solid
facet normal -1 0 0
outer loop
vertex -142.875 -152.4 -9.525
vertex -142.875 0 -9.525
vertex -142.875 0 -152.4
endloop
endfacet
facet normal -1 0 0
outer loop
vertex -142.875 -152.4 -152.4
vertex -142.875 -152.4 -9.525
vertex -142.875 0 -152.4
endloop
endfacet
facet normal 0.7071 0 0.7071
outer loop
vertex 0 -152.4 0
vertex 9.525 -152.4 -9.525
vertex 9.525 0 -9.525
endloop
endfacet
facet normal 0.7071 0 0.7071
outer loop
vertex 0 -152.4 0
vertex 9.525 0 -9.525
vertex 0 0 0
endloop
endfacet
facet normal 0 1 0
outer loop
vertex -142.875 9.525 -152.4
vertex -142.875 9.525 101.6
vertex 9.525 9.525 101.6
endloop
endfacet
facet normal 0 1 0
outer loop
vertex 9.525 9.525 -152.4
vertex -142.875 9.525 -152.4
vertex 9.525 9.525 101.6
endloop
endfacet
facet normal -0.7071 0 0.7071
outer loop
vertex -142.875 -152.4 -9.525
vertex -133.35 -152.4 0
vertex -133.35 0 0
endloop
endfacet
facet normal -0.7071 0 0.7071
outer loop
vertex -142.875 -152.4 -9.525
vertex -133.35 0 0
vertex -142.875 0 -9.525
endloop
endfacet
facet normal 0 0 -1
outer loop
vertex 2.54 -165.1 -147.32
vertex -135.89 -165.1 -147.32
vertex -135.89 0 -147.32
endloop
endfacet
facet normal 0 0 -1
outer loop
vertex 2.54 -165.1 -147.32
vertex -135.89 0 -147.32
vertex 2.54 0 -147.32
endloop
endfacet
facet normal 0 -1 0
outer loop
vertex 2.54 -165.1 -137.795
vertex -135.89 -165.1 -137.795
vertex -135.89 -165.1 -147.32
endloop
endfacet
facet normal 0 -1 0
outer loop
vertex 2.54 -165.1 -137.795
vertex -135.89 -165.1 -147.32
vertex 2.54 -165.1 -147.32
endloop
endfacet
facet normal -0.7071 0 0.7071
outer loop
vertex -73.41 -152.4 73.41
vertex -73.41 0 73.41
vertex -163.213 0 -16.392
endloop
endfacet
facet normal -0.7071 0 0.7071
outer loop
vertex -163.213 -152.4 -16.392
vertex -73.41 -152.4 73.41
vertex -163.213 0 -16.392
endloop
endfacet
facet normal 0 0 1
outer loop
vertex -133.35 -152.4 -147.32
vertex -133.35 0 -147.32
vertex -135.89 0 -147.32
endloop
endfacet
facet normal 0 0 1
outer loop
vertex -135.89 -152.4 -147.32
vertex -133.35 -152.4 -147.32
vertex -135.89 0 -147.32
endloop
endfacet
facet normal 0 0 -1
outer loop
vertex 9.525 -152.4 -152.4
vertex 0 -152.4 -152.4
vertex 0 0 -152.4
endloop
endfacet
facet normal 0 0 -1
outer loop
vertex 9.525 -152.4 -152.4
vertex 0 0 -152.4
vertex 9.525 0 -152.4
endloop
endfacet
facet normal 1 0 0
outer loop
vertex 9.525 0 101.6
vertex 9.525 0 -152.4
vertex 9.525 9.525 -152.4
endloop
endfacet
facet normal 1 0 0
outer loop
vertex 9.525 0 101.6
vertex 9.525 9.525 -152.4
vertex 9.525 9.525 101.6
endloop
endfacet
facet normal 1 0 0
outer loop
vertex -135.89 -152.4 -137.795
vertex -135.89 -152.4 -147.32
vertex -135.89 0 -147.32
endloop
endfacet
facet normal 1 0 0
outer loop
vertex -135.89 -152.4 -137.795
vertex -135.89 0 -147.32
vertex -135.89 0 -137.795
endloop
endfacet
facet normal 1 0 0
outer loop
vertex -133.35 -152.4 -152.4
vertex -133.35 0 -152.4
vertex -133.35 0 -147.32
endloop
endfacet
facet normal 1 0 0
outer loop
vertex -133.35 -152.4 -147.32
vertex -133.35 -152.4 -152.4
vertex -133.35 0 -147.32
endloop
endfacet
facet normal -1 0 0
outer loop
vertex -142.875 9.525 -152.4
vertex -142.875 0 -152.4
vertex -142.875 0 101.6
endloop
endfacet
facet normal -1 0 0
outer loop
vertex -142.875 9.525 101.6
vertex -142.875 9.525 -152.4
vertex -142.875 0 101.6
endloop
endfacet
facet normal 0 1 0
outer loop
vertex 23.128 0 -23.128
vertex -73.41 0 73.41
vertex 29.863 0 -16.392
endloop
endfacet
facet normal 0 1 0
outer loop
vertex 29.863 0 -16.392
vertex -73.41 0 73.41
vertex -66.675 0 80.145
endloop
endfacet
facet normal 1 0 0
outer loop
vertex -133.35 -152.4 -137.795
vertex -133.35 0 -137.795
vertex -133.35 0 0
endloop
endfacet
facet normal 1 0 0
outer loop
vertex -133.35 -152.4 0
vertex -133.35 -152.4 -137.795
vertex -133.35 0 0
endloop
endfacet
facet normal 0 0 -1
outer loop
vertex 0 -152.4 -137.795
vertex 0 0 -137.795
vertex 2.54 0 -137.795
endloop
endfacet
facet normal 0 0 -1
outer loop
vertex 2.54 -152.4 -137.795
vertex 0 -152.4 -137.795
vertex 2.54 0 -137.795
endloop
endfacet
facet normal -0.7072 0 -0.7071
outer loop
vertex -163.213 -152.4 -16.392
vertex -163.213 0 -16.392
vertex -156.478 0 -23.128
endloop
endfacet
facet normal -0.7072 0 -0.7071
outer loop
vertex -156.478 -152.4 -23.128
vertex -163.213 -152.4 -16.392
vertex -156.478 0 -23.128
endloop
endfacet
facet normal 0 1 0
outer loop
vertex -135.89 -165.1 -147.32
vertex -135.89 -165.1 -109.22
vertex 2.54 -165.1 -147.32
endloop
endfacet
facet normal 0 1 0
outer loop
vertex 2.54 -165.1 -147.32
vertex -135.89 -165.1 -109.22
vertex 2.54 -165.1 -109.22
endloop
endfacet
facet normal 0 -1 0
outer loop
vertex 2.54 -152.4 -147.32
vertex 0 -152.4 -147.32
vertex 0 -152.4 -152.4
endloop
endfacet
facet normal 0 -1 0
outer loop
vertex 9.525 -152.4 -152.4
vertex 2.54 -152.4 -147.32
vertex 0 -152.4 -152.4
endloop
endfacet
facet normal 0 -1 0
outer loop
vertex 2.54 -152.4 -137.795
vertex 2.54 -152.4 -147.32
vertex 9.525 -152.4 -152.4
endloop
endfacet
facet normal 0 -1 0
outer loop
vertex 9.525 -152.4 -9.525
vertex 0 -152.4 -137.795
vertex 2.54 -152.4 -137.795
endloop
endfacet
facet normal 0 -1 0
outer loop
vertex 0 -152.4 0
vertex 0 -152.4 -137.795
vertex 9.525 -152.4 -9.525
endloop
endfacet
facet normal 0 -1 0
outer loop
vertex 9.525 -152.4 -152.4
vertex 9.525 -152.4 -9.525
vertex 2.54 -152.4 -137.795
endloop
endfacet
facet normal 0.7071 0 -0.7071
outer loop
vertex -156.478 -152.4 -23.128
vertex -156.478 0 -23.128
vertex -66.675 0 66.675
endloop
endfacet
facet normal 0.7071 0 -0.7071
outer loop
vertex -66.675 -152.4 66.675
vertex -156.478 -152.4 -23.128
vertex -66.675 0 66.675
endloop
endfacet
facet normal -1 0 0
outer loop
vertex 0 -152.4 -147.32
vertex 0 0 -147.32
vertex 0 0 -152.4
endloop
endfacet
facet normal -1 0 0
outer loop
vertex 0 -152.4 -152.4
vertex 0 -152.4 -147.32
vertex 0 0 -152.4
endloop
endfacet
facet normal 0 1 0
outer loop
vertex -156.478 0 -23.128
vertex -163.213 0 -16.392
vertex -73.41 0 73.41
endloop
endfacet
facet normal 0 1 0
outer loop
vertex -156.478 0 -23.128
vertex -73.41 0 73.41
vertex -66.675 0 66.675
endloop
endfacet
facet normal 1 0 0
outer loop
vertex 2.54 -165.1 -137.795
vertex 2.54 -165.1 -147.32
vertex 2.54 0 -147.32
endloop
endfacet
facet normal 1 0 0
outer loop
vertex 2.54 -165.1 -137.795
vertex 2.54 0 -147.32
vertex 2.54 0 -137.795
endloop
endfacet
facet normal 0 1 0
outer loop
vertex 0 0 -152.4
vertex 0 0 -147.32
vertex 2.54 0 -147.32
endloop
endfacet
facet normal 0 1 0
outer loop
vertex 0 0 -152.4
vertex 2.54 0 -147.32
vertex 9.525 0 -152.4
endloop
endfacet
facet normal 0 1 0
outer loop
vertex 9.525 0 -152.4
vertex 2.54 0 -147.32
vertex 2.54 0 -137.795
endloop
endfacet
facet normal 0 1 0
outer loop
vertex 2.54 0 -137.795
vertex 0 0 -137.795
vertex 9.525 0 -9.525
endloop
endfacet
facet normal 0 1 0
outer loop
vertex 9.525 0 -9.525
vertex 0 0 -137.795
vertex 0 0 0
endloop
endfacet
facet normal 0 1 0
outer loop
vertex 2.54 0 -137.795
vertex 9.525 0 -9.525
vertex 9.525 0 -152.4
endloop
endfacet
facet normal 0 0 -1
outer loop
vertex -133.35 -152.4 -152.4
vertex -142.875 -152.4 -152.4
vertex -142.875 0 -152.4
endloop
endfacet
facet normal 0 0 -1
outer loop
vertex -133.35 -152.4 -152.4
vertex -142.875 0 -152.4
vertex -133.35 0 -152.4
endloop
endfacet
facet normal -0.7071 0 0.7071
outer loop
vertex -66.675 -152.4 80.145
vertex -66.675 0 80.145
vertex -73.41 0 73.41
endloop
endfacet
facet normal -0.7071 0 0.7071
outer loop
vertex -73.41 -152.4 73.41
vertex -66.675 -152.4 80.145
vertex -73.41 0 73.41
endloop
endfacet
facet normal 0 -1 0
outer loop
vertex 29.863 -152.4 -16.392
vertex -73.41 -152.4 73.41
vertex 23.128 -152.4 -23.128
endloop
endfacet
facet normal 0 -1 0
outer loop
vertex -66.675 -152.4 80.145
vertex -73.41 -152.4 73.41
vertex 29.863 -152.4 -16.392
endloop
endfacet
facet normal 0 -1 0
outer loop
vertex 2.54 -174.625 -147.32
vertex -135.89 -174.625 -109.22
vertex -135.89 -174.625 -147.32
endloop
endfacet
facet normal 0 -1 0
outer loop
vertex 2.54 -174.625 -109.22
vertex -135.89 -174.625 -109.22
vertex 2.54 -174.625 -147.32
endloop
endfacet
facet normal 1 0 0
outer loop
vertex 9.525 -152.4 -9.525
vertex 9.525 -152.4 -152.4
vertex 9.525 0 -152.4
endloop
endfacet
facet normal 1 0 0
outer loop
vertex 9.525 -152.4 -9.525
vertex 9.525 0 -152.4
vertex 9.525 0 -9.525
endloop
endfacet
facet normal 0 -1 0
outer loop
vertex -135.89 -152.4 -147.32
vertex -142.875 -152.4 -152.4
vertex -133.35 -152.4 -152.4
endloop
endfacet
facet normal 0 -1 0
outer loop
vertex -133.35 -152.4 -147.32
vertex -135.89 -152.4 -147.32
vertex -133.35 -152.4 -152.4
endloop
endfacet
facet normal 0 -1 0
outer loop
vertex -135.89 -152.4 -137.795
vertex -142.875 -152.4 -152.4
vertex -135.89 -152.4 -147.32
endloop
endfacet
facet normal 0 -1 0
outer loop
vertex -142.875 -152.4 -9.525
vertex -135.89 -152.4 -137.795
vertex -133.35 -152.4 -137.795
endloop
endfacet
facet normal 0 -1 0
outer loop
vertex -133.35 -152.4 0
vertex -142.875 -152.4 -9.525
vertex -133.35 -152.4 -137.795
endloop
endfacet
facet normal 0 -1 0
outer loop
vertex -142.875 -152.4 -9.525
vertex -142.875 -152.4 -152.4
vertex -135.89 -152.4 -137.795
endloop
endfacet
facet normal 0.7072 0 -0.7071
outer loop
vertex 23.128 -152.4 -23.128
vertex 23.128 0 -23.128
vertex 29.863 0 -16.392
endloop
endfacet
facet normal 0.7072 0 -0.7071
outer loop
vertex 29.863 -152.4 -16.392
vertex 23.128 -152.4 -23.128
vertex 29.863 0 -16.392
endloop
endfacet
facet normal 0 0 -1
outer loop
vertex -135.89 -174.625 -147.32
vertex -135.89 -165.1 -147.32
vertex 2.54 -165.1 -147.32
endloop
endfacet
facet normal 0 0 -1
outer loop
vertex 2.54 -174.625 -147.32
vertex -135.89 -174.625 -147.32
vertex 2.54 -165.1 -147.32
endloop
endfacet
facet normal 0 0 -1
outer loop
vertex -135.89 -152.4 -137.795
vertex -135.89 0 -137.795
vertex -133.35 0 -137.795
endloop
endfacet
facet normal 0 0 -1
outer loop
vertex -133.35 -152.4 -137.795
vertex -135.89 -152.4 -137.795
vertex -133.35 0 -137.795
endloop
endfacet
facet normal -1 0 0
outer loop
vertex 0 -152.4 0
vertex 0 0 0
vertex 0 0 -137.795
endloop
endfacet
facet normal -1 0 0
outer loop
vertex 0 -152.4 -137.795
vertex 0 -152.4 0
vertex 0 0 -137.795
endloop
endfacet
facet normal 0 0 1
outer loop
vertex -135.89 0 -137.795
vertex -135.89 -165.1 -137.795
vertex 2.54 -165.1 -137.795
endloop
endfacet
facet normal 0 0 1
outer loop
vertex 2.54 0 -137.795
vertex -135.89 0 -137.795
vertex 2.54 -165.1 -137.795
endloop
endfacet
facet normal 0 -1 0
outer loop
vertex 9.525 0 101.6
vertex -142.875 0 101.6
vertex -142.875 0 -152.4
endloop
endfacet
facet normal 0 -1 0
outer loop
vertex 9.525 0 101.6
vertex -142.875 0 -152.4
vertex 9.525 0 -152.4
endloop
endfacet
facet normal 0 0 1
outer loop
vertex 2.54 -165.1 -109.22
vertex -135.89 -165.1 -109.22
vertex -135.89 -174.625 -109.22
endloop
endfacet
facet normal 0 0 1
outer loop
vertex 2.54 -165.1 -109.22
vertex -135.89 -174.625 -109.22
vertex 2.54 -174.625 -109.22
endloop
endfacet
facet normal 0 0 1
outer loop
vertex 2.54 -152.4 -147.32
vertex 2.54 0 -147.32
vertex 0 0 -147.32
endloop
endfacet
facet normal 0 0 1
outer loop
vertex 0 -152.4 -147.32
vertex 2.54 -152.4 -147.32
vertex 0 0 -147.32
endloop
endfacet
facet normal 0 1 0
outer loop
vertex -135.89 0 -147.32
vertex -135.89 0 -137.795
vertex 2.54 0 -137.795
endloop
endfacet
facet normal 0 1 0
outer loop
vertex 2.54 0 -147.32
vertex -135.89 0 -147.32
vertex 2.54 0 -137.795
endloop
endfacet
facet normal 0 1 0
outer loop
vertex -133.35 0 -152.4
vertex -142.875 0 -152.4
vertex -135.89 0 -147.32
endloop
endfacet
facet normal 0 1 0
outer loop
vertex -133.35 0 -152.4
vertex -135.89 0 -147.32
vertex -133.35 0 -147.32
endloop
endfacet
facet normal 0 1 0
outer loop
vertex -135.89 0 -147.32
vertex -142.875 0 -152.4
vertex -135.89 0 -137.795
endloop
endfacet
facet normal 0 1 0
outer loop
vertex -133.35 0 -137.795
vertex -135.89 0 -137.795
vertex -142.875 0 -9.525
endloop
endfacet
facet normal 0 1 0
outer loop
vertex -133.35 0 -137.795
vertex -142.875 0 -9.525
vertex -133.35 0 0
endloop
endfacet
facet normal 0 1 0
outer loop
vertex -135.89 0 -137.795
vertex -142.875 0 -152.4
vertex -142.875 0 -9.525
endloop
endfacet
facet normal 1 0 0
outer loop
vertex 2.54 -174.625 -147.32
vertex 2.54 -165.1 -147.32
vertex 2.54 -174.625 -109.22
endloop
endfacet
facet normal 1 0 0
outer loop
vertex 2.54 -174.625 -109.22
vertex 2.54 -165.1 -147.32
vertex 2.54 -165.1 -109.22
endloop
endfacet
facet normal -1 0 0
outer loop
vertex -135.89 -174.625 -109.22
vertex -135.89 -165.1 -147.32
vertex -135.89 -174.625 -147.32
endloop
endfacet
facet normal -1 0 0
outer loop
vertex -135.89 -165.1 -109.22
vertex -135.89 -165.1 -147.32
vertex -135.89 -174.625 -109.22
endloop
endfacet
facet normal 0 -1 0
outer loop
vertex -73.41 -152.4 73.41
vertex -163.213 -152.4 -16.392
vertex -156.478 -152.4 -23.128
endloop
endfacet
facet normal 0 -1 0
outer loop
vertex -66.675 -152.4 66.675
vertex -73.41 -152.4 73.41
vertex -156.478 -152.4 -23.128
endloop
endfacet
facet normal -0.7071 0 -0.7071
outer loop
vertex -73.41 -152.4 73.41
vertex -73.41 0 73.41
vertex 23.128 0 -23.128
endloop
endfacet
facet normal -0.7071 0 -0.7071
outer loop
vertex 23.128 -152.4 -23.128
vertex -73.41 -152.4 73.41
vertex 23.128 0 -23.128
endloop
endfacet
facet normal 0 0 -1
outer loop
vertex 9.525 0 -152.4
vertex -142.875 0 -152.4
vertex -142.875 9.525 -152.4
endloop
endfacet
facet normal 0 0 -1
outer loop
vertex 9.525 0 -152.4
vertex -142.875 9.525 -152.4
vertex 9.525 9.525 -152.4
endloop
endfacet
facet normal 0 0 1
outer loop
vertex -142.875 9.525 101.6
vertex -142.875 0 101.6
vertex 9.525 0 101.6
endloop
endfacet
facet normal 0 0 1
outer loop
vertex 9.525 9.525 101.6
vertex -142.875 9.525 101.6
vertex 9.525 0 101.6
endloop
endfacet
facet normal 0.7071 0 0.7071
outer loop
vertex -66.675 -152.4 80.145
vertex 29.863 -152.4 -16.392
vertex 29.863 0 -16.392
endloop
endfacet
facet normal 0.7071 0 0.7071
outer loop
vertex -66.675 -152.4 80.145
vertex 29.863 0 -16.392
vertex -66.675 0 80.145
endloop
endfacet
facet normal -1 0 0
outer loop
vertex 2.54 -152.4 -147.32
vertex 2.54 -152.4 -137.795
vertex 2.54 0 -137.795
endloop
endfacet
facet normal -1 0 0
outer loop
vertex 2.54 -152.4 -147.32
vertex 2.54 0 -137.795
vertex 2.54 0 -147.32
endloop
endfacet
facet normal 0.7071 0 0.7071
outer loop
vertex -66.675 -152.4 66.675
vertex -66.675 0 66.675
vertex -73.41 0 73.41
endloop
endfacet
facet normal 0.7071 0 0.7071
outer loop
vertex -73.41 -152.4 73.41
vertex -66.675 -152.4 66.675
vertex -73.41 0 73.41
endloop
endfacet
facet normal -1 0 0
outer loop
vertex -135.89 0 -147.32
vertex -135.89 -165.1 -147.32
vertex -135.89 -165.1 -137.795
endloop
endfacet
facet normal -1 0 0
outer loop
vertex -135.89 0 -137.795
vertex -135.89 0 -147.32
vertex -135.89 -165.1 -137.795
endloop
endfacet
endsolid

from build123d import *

# Parameters (mm, degrees)
F1_DEPTH  = 152.4
F2_W      = 138.43
F2_H      = 9.525
F3_DEPTH  = 165.1
F5_DEPTH  = 152.4
F7_DEPTH  = 152.4
F8_W      = 138.43
F8_H      = 38.1
F9_DEPTH  = 9.525
F10_W     = 152.4
F10_H     = 254
F11_DEPTH = 9.525


with BuildPart() as f1:
    # F0 (on Front) → F1 (new body)
    with BuildSketch(Plane.XZ):
        Polygon((0, -147.32), (0, -152.4), (9.525, -152.4), (9.525, -9.525), (0, 0), (0, -137.795), (2.54, -137.795), (2.54, -147.32), align=None)
        Polygon((-133.35, -152.4), (-133.35, -147.32), (-135.89, -147.32), (-135.89, -137.795), (-133.35, -137.795), (-133.35, 0), (-142.875, -9.525), (-142.875, -152.4), align=None)
    extrude(amount=F1_DEPTH)


with BuildPart() as f3:
    # F2 (on Front) → F3 (new body)
    with BuildSketch(Plane.XZ):
        with Locations((-66.675, -142.5575)):
            Rectangle(F2_W, F2_H)
    extrude(amount=F3_DEPTH)


with BuildPart() as f5:
    # F4 (on Front) → F5 (new body)
    with BuildSketch(Plane.XZ):
        Polygon((-163.212753, -16.392369), (-156.477561, -23.127561), (-66.675, 66.675), (-73.410192, 73.410192), align=None)
    extrude(amount=F5_DEPTH)


with BuildPart() as f7:
    # F6 (on Front) → F7 (new body)
    with BuildSketch(Plane.XZ):
        Polygon((-66.675, 80.145384), (-73.410192, 73.410192), (23.127561, -23.127561), (29.862753, -16.392369), align=None)
    extrude(amount=F7_DEPTH)


with BuildPart() as f9:
    # F8 (on face) → F9 (new body)
    with BuildSketch(Plane.XZ.offset(165.1)):
        with Locations((-66.675, -128.27)):
            Rectangle(F8_W, F8_H)
    extrude(amount=F9_DEPTH)


with BuildPart() as f11:
    # F10 (on Front) → F11 (new body)
    with BuildSketch(Plane.XZ):
        with Locations((-66.675, -25.4)):
            Rectangle(F10_W, F10_H)
    extrude(amount=-F11_DEPTH)


solid = Compound([f1.part, f3.part, f5.part, f7.part, f9.part, f11.part])
